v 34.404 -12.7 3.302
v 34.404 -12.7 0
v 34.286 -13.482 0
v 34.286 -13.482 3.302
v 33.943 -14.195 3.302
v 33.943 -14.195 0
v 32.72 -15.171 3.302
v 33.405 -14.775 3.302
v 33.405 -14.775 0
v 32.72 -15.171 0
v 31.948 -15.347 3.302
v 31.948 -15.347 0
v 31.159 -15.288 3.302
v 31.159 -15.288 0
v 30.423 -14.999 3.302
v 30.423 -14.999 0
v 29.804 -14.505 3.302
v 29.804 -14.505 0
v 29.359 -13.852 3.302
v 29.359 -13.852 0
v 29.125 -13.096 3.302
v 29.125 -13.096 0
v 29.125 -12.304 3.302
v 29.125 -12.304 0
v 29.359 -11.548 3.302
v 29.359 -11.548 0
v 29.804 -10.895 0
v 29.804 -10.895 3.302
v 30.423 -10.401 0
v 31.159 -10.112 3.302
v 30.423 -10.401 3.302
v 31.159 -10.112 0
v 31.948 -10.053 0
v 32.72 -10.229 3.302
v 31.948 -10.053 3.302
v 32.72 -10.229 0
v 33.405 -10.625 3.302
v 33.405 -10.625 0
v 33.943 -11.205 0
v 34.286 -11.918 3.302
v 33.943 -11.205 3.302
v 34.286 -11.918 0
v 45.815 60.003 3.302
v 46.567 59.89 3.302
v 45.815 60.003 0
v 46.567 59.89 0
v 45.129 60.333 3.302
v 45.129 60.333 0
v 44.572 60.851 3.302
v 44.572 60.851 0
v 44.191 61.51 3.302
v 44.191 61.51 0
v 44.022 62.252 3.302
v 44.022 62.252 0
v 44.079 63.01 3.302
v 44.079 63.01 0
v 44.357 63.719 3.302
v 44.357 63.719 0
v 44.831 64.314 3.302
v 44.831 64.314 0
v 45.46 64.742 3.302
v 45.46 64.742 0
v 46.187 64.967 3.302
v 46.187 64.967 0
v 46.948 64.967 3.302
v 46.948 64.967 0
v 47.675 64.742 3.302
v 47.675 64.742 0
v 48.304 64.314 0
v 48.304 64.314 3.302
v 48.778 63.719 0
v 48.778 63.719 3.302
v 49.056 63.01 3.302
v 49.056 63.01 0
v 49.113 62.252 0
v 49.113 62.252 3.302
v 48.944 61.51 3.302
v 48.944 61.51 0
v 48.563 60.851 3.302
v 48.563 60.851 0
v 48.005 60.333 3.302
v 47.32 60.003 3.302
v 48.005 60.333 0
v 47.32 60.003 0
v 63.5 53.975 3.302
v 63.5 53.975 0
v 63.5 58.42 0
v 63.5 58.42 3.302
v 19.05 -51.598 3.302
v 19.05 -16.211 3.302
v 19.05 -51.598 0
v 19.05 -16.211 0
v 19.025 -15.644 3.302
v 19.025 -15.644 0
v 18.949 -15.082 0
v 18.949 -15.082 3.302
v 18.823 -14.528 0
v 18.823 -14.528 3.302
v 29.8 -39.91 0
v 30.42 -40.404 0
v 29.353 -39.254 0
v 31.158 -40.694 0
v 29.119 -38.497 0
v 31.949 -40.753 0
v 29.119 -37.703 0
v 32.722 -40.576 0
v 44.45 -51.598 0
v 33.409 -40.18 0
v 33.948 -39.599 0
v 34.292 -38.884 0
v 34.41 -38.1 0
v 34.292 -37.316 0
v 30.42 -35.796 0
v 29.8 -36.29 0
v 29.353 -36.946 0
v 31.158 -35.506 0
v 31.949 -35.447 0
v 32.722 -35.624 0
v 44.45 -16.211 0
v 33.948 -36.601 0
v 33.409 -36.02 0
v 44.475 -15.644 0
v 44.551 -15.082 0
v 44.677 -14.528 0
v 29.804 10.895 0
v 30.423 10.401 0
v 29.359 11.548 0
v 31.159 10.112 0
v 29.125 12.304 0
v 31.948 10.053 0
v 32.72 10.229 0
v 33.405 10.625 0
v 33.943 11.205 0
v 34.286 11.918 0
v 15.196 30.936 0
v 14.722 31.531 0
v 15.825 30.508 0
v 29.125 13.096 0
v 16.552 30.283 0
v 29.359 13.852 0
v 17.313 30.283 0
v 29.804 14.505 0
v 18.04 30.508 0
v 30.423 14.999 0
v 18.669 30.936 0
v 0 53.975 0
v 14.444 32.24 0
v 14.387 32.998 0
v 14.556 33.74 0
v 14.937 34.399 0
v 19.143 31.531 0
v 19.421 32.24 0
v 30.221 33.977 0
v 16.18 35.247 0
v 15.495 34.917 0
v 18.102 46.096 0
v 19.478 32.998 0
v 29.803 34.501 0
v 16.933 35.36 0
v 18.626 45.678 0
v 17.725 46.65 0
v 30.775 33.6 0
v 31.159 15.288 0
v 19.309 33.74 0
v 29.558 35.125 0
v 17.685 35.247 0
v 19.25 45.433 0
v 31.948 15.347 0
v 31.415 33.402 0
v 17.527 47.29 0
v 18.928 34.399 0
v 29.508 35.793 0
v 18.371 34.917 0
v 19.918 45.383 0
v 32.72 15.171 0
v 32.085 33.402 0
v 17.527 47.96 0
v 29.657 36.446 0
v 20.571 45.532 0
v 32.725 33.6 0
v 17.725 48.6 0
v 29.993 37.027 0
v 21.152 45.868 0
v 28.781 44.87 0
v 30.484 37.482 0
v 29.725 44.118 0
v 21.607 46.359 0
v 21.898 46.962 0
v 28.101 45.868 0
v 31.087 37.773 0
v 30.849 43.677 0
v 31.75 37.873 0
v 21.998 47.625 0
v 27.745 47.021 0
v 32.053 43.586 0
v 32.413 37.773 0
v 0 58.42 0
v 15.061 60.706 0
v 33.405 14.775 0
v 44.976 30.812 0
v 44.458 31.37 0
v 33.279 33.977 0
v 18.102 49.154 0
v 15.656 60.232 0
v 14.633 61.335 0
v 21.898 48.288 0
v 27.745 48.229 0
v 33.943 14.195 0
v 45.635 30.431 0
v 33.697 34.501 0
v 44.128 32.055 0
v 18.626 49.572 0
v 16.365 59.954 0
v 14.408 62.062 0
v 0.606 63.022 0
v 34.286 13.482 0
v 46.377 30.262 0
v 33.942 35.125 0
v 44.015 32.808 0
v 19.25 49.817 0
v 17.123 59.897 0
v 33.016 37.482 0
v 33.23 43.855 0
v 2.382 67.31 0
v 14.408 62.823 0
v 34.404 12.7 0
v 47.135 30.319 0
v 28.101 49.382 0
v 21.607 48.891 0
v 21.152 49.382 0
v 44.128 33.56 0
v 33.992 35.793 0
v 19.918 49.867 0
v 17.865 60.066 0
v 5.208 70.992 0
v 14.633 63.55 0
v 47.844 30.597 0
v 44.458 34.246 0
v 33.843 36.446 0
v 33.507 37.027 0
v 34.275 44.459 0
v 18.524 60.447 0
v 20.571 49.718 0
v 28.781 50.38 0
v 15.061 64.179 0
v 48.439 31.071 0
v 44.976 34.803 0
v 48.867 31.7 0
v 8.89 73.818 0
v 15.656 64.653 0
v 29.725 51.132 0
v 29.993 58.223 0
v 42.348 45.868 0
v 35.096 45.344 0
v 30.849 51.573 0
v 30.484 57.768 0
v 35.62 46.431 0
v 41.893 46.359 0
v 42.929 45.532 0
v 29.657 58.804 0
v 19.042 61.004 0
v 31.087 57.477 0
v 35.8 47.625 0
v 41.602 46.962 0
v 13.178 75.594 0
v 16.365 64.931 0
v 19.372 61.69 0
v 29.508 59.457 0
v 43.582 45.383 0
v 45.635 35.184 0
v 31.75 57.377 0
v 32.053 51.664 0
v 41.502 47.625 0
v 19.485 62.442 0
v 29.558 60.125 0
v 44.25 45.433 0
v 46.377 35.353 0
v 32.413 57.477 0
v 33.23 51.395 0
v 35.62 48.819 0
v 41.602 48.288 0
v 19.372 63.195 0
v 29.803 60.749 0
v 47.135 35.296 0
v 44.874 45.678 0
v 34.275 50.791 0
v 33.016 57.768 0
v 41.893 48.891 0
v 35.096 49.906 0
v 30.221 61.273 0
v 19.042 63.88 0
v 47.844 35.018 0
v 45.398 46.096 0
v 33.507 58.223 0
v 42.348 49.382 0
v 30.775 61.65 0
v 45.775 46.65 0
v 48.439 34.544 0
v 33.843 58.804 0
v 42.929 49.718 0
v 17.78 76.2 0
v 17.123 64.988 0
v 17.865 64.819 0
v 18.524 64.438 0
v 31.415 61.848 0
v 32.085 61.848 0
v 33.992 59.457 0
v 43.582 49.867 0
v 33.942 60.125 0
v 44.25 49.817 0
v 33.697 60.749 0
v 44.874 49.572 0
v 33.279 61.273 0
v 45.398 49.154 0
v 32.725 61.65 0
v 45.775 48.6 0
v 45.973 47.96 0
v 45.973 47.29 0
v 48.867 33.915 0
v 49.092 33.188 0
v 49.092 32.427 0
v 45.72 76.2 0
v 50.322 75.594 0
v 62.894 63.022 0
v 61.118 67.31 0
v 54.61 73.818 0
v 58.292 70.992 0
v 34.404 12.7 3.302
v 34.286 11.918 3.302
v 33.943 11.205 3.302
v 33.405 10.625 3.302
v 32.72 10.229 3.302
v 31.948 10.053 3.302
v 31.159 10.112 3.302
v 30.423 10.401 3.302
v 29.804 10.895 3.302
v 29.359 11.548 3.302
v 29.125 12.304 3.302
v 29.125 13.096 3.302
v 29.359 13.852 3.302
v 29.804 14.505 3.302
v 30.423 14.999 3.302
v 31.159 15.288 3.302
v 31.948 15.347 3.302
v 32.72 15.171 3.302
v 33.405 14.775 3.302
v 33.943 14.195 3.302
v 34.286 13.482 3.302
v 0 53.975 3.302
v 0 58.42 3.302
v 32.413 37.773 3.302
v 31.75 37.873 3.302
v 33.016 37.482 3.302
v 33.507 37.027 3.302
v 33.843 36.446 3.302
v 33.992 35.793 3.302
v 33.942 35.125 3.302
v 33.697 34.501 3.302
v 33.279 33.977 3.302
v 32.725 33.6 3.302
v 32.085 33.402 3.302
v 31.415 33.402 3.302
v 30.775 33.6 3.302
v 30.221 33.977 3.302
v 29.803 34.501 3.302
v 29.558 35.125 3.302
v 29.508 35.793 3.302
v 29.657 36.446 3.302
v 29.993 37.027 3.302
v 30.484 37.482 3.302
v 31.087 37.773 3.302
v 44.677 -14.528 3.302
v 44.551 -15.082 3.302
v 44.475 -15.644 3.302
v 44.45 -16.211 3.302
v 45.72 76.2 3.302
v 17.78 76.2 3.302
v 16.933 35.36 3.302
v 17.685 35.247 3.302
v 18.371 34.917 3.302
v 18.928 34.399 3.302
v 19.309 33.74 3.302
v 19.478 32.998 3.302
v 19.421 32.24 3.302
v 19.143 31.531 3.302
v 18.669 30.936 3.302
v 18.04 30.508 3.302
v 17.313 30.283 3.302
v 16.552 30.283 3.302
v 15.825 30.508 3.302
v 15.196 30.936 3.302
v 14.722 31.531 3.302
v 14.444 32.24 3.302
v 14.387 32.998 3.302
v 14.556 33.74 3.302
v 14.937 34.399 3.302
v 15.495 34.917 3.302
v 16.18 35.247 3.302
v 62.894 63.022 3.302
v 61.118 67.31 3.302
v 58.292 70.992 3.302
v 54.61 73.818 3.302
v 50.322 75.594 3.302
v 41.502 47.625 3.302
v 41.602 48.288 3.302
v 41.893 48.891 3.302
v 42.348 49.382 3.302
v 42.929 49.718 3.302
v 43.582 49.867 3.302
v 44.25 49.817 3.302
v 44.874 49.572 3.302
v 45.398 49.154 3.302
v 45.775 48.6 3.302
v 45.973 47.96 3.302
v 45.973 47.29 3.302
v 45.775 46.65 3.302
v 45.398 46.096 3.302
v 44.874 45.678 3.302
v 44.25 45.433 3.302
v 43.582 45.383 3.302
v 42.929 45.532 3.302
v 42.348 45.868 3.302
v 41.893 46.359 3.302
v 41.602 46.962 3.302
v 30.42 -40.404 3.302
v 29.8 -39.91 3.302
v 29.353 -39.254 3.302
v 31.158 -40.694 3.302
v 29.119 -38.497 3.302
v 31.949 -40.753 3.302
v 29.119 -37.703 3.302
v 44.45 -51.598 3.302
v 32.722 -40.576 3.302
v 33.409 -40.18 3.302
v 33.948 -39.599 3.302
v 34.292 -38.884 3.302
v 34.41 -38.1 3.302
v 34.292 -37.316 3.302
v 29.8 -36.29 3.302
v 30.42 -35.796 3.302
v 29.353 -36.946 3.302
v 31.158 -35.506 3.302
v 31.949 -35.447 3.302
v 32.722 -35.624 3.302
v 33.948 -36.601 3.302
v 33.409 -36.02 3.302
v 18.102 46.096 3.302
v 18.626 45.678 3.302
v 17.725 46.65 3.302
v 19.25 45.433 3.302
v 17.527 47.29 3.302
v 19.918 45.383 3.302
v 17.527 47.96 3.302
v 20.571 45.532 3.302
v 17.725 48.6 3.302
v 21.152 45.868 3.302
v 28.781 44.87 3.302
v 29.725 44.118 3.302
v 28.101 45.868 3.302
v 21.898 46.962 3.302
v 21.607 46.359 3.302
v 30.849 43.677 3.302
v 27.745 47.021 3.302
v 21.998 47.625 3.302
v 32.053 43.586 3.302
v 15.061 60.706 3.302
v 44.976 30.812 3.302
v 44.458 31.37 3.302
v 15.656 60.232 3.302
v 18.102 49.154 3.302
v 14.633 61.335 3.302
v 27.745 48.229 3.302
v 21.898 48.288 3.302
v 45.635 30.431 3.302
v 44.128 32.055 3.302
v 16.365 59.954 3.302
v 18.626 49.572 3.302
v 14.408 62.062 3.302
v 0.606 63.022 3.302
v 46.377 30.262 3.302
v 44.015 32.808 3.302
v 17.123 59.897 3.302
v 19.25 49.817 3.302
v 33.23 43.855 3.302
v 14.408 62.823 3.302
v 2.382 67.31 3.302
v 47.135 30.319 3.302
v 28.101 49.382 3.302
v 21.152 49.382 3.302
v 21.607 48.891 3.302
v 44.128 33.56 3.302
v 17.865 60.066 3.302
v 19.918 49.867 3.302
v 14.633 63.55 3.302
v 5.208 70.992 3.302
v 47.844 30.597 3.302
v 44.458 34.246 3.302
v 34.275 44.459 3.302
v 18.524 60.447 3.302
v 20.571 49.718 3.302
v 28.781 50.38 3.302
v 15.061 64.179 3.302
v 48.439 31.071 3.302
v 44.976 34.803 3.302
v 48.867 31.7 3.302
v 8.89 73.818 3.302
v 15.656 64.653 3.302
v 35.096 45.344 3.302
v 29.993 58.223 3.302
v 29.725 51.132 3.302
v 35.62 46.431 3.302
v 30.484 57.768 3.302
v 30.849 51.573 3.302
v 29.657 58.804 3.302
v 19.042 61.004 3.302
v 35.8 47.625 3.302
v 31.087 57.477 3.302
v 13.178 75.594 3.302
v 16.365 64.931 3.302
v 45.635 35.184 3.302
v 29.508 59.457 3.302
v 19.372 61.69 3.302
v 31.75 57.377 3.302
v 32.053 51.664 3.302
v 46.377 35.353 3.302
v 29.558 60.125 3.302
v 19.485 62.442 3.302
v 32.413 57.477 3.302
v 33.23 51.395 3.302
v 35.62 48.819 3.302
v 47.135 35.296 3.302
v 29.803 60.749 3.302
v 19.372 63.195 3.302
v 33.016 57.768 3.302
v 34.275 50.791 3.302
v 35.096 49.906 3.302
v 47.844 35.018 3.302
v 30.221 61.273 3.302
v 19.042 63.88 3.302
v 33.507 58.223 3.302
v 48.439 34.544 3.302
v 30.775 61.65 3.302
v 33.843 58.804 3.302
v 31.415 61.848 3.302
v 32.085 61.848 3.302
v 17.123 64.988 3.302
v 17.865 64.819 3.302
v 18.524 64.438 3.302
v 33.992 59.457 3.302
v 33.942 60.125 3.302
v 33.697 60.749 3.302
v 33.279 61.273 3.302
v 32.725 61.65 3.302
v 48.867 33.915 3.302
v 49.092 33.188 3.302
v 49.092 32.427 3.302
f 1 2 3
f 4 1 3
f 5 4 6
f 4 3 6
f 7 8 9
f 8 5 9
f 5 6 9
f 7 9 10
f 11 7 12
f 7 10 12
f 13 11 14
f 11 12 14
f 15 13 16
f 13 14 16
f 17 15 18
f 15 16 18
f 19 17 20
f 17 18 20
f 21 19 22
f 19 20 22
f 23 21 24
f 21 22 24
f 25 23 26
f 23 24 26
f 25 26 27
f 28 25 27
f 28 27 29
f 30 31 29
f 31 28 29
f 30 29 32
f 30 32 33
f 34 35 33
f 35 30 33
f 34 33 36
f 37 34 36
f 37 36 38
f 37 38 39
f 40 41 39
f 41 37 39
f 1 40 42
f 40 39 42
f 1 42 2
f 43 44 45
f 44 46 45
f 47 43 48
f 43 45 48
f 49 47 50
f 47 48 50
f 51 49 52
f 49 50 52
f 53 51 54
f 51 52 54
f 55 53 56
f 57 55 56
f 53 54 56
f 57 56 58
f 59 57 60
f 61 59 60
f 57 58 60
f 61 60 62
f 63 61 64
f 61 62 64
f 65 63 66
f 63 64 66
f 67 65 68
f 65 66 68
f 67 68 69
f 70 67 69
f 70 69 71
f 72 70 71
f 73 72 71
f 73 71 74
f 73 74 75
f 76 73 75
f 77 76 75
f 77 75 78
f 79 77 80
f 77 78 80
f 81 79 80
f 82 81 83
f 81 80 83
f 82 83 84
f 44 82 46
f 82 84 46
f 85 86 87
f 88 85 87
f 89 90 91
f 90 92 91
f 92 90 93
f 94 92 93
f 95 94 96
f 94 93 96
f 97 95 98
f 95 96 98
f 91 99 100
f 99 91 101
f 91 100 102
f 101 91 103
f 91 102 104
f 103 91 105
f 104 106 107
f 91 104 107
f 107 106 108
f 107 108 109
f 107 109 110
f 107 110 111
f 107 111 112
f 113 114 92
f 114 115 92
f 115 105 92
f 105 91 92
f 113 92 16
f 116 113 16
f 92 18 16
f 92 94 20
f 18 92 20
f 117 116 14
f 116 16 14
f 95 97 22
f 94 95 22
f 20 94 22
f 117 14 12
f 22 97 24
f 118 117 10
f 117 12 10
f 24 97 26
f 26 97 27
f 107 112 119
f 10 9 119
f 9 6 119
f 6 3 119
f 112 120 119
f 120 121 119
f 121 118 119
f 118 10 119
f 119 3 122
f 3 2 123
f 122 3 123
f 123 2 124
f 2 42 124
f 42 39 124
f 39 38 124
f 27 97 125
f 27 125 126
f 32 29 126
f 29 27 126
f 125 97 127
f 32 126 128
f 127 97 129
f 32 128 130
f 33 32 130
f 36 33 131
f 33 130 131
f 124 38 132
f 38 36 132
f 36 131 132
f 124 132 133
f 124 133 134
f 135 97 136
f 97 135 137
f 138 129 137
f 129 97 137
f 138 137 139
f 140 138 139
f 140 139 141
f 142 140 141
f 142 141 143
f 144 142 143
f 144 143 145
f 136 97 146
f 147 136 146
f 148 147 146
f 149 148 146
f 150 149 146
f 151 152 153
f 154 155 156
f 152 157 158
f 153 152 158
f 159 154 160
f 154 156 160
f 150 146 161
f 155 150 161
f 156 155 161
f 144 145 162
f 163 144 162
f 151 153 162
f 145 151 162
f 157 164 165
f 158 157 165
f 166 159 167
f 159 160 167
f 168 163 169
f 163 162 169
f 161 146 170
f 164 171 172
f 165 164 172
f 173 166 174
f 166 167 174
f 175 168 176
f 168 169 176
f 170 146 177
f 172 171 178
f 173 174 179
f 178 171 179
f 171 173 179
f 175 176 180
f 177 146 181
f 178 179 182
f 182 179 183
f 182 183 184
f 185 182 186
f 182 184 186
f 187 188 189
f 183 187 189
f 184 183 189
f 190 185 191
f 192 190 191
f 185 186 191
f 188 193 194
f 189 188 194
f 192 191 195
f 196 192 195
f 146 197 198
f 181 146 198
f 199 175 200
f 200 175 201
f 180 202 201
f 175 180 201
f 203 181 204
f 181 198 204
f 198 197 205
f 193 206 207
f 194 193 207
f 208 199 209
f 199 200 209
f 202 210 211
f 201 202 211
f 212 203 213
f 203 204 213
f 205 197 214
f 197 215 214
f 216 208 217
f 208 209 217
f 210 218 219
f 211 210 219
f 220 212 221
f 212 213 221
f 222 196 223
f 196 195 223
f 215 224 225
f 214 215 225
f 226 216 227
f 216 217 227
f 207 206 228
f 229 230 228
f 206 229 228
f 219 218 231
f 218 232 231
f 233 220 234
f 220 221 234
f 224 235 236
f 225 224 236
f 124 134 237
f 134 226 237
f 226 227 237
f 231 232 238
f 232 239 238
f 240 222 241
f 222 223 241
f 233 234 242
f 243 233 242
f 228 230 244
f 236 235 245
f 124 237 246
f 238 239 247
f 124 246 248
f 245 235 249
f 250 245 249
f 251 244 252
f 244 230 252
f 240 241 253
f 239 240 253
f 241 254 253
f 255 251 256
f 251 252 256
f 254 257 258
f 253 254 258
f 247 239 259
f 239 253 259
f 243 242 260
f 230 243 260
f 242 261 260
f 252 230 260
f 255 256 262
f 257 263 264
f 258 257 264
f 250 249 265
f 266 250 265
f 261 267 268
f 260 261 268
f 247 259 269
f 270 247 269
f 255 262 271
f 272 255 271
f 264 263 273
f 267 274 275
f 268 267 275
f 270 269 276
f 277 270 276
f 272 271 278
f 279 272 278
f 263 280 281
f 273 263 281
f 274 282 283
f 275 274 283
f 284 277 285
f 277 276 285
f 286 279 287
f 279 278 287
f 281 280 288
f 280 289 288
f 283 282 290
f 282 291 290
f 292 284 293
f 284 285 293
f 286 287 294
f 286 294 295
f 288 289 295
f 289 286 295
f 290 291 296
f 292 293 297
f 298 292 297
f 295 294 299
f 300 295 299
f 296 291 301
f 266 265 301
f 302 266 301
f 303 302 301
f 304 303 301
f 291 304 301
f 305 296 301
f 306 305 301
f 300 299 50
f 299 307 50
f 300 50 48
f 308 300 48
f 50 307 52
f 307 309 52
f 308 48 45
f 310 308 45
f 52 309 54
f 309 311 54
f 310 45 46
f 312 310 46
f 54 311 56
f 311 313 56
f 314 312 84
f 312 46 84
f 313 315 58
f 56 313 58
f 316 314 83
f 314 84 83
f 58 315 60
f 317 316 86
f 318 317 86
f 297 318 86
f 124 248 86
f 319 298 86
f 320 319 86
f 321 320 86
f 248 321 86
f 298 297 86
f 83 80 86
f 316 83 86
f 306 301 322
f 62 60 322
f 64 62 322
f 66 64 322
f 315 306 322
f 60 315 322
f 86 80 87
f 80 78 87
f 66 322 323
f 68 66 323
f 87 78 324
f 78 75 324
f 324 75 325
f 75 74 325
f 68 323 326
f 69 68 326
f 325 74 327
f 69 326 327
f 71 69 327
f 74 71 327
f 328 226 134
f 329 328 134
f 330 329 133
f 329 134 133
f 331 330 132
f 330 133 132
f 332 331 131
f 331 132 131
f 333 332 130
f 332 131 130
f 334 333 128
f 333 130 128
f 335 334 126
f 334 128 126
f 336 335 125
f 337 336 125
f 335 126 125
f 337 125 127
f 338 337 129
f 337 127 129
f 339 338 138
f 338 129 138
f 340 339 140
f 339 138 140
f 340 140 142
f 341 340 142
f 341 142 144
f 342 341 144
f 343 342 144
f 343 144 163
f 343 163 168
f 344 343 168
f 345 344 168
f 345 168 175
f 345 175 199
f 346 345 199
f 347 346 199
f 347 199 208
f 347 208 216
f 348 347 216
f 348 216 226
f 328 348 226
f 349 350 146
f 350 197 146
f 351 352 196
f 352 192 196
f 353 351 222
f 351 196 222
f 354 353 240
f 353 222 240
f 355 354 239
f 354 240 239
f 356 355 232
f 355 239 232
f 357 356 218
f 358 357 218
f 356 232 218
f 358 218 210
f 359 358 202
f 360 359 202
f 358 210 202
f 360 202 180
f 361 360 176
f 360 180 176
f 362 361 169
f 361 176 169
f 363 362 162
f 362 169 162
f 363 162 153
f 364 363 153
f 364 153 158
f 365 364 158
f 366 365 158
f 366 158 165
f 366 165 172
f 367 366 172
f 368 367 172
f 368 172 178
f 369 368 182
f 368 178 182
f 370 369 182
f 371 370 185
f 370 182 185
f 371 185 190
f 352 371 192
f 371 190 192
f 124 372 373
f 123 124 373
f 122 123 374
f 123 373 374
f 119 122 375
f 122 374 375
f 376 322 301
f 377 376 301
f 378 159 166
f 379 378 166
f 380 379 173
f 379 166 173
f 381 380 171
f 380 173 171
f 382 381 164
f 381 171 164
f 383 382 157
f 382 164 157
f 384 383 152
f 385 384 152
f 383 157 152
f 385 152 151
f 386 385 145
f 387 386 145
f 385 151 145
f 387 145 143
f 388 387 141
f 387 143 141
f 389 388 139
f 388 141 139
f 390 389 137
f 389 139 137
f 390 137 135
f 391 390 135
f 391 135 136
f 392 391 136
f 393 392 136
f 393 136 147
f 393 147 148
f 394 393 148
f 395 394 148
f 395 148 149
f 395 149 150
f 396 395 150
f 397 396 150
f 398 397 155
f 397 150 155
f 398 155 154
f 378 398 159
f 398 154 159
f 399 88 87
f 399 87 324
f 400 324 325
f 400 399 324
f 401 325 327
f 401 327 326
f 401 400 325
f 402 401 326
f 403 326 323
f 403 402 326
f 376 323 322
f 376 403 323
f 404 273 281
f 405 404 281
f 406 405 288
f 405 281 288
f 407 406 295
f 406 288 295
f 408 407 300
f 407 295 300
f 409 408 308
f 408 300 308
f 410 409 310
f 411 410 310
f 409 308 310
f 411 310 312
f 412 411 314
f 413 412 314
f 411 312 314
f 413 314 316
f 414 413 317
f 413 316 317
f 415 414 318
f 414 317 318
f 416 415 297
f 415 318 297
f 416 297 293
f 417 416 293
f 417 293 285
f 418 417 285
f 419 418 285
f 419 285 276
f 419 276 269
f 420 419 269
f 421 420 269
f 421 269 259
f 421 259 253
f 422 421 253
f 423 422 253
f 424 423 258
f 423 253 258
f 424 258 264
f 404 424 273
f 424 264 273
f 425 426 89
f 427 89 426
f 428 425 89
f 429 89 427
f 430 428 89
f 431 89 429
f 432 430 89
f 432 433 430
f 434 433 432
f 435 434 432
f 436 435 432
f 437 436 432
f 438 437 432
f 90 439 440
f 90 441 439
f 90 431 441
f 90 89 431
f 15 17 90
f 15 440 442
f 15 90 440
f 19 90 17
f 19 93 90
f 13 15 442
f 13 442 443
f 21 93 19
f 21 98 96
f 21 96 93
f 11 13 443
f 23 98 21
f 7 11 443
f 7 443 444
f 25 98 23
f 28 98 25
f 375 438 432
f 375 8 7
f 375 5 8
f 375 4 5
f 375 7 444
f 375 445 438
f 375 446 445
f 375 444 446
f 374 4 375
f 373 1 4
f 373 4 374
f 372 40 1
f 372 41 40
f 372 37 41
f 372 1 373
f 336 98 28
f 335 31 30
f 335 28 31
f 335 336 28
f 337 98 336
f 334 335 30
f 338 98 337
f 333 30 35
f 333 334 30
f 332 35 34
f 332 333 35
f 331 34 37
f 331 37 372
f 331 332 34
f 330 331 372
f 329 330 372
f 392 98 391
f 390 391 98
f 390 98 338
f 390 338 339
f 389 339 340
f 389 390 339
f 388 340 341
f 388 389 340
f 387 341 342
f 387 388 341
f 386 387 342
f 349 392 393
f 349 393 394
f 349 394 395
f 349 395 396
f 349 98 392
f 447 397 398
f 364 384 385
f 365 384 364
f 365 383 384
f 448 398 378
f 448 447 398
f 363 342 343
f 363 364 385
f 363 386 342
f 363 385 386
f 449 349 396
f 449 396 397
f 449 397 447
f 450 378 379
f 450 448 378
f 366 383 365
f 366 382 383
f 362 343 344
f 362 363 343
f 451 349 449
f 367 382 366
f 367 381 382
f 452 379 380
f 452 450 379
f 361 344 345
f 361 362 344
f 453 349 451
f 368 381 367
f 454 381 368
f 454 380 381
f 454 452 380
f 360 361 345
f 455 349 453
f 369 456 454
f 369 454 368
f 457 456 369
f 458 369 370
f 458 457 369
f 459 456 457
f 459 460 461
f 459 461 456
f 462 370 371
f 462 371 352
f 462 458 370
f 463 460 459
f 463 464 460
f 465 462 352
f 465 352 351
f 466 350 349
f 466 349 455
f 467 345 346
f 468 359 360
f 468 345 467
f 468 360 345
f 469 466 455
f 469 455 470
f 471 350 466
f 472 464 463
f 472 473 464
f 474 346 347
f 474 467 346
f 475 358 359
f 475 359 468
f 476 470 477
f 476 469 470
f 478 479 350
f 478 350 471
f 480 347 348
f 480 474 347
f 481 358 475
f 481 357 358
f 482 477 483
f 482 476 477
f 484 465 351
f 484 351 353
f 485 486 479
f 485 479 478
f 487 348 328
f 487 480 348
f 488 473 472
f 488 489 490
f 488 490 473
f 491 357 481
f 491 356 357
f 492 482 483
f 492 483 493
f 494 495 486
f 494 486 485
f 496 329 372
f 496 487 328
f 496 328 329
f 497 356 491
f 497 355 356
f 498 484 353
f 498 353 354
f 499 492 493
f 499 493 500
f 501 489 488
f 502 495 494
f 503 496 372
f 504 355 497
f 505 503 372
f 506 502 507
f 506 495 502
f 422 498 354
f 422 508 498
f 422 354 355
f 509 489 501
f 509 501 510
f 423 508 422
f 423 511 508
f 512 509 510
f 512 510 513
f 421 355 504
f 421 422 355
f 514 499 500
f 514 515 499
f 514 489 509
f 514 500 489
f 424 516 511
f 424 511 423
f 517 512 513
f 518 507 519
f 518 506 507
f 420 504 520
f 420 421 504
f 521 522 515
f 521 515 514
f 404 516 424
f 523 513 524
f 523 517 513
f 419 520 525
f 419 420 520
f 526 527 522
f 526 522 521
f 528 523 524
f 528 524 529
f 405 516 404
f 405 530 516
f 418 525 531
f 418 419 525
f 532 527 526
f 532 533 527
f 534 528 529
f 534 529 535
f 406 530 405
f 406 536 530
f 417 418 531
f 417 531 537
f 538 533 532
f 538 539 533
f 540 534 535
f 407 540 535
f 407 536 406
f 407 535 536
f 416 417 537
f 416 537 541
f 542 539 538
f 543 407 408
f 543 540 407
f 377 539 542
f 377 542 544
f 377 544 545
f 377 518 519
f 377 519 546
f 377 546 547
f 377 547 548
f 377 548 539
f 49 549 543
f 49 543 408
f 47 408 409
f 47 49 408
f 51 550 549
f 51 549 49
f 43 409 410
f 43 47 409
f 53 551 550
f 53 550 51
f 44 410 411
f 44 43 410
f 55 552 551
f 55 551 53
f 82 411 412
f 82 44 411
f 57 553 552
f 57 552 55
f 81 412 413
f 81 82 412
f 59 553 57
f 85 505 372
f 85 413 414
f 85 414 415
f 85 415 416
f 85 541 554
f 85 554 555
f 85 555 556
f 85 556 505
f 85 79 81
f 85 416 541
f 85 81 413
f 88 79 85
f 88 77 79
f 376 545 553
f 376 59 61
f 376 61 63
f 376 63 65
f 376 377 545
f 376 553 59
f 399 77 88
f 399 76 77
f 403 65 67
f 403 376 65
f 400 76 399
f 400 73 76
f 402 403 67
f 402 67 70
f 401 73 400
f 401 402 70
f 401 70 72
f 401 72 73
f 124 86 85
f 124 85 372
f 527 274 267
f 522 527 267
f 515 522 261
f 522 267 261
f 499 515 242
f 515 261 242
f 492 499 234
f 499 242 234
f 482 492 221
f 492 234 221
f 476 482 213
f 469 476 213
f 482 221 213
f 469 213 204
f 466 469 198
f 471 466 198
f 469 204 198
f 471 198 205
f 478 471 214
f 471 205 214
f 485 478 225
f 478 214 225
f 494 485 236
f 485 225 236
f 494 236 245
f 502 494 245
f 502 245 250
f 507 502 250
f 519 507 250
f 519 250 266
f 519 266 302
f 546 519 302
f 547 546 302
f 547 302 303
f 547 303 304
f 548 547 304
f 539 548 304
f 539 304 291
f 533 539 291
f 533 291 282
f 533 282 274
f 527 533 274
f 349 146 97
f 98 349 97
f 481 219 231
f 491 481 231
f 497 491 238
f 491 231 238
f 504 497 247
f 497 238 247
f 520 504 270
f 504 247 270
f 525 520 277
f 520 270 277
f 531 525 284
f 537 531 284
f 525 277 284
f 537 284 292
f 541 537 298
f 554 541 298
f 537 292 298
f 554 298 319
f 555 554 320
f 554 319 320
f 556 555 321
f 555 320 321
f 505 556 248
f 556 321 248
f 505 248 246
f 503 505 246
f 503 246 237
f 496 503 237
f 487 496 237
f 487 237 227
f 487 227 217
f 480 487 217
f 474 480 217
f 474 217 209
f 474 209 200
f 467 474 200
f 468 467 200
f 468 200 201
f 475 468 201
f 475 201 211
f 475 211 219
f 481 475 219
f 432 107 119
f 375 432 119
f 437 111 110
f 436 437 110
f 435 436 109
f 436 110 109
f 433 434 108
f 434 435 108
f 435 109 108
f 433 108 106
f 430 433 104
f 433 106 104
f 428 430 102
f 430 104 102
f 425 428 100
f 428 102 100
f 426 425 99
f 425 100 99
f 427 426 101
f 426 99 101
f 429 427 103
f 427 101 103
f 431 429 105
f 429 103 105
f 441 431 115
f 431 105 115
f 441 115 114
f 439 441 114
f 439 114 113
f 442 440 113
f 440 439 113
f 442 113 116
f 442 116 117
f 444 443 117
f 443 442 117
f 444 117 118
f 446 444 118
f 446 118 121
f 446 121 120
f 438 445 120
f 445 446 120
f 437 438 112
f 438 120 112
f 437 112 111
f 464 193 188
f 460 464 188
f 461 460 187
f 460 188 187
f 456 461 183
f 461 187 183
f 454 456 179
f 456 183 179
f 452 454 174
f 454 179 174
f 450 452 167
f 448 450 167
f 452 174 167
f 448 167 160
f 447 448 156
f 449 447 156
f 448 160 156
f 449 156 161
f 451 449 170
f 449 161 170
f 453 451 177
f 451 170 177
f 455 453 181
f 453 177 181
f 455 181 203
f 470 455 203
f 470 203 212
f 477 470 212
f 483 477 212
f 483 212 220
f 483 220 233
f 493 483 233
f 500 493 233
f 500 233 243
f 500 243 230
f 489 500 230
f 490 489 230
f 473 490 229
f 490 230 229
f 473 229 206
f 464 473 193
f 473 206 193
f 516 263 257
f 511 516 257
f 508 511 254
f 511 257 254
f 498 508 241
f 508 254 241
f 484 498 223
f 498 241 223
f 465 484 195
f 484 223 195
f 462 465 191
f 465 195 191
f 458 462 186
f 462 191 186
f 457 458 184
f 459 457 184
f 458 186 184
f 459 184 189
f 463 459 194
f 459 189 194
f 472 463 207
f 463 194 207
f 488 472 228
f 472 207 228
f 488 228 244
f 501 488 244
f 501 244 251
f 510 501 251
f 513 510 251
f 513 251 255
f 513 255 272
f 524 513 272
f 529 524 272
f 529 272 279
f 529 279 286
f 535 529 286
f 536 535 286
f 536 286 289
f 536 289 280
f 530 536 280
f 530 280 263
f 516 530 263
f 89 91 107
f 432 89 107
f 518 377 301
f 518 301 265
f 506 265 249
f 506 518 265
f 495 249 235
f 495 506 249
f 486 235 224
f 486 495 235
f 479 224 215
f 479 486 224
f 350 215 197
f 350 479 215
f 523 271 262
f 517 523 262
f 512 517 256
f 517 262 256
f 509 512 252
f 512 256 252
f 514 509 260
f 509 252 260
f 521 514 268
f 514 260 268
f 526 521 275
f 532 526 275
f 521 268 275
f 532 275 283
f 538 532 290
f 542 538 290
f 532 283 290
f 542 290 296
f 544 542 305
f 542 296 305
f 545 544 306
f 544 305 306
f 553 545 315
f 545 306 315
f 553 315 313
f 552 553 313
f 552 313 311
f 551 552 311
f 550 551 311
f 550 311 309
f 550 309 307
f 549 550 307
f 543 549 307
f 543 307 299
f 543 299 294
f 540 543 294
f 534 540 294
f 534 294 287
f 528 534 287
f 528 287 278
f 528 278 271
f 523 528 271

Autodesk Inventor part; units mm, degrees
ref_plane "YZ Plane" through (0, 0, 0) normal (1, 0, 0) x (0, 1, 0)
ref_plane "XZ Plane" through (0, 0, 0) normal (0, 1, 0) x (-1, 0, 0)
ref_plane "XY Plane" through (0, 0, 0) normal (0, 0, 1) x (1, 0, 0)
sketch "Sketch1" plane through (0, 0, 0) normal (0, 0, 1) x (1, 0, 0)
  line L0 (63.5, 76.2) -> (0, 76.2)
  line L1 (0, 76.2) -> (0, 53.975)
  circle A0 centre (31.75, 47.625) radius 4.05
  line L2 (19.05, -6.35) -> (44.45, -6.35)
  line L3 (63.5, 53.975) -> (63.5, 76.2)
  line L4 (31.75, 76.2) -> (31.75, -6.35)
  circle A1 centre (31.75, 12.7) radius 2.6543
  circle A2 centre (31.75, -12.7) radius 2.6543
  circle A3 centre (31.75, -38.1) radius 2.6604
  line L5 (63.5, 53.975) -> (63.5, -6.35)
  line L6 (63.5, -6.35) -> (0, -6.35)
  line L7 (0, -6.35) -> (0, 53.975)
  line L8 (19.05, -15.3543) -> (19.05, -51.598)
  line L9 (19.05, -51.598) -> (44.45, -51.598)
  line L10 (44.45, -51.598) -> (44.45, -15.3543)
  line L11 (63.5, 53.975) -> (44.45, -15.3543)
  line L12 (0, 53.975) -> (19.05, -15.3543)
  point P0 (0, 0)
  dimension "d0" = 63.5
  dimension "d2" = 8.1
  dimension "d5" = 28.575
  dimension "d50" = 82.55
  dimension "d54" = 5.3086
  dimension "d55" = 63.5
  dimension "d59" = 25.4
  dimension "d60" = 25.4
  dimension "d61" = 25.4
extrude "Extrusion1" add sketch "Sketch1" along normal blind 3.302 contours L3 L11 L6 L2 L4 A1 A0 L0 | L4 A0 A1 L2 L6 L12 L1 L0 | L11 L10 L9 L8 L12 L6 L2
fillet "Fillet11" radius 17.78 1 edges at (63.5, 76.2, 1.651)
fillet "Fillet12" radius 17.78 1 edges at (0, 76.2, 1.651)
sketch "Sketch3" plane through (0, 0, 3.302) normal (0, 0, 1) x (1, 0, 0)
  circle A0 centre (31.75, 47.625) radius 4.05 projected
  circle A1 centre (31.75, 47.625) radius 16
  circle A2 centre (31.75, 47.625) radius 8
  circle A3 centre (31.75, 47.625) radius 12
  line L0 (31.75, 47.625) -> (31.75, 69.8383)
  line L1 (31.75, 47.625) -> (53.9633, 47.625) construction
  point P0 (0, 0)
  point P1 (31.75, 59.625)
  dimension "d28" = 24
  dimension "d26" = 32
  dimension "d27" = 16
  dimension "d36" = 90
hole "Hole1" at (31.75, 59.625, 3.302) direction (0, 0, -1) diameter 4.4958 depth 14.1986 tip angle 118 clearance for "Flat Head Machine Screw" size "M4" standard "Ansi Metric M Profile"
pattern_circular "Circular Pattern1" count 4 over 360 about axis through (31.75, 47.625, 0) along (0, 0, 1) of "Hole1"
sketch "Sketch4" plane through (0, 0, 3.302) normal (0, 0, 1) x (1, 0, 0)
  circle A0 centre (31.75, 47.625) radius 4.05 projected
  circle A1 centre (31.75, 47.625) radius 12
  circle A2 centre (31.75, 47.625) radius 16
  circle A3 centre (31.75, 47.625) radius 20.955
  line L0 (45.72, 76.2) -> (17.78, 76.2) projected
  line L1 (31.75, 47.625) -> (51.1677, 67.0427)
  line L2 (31.75, 47.625) -> (59.2107, 47.625) construction
  point P0 (0, 0)
  point P1 (46.5674, 62.4424)
  dimension "d42" = 41.91
  dimension "d40" = 24
  dimension "d41" = 32
  dimension "d58" = 45
hole "Hole2" at (46.5674, 62.4424, 3.302) direction (0, 0, -1) diameter 5.1054 depth 16.256 tip angle 118 clearance for "Flat Head Machine Screw (82)" size "#10" standard "Ansi Unified Screw Threads"
pattern_circular "Circular Pattern2" count 4 over 360 about axis through (31.75, 47.625, 0) along (0, 0, 1) of "Hole2"
fillet "Fillet16" radius 6.35 2 edges at (44.45, -15.3543, 1.651) (19.05, -15.3543, 1.651)
equation "\"d54\" = d3"
equation "\"d3\" = 5.3086"
properties part number "Arm Plate3"
